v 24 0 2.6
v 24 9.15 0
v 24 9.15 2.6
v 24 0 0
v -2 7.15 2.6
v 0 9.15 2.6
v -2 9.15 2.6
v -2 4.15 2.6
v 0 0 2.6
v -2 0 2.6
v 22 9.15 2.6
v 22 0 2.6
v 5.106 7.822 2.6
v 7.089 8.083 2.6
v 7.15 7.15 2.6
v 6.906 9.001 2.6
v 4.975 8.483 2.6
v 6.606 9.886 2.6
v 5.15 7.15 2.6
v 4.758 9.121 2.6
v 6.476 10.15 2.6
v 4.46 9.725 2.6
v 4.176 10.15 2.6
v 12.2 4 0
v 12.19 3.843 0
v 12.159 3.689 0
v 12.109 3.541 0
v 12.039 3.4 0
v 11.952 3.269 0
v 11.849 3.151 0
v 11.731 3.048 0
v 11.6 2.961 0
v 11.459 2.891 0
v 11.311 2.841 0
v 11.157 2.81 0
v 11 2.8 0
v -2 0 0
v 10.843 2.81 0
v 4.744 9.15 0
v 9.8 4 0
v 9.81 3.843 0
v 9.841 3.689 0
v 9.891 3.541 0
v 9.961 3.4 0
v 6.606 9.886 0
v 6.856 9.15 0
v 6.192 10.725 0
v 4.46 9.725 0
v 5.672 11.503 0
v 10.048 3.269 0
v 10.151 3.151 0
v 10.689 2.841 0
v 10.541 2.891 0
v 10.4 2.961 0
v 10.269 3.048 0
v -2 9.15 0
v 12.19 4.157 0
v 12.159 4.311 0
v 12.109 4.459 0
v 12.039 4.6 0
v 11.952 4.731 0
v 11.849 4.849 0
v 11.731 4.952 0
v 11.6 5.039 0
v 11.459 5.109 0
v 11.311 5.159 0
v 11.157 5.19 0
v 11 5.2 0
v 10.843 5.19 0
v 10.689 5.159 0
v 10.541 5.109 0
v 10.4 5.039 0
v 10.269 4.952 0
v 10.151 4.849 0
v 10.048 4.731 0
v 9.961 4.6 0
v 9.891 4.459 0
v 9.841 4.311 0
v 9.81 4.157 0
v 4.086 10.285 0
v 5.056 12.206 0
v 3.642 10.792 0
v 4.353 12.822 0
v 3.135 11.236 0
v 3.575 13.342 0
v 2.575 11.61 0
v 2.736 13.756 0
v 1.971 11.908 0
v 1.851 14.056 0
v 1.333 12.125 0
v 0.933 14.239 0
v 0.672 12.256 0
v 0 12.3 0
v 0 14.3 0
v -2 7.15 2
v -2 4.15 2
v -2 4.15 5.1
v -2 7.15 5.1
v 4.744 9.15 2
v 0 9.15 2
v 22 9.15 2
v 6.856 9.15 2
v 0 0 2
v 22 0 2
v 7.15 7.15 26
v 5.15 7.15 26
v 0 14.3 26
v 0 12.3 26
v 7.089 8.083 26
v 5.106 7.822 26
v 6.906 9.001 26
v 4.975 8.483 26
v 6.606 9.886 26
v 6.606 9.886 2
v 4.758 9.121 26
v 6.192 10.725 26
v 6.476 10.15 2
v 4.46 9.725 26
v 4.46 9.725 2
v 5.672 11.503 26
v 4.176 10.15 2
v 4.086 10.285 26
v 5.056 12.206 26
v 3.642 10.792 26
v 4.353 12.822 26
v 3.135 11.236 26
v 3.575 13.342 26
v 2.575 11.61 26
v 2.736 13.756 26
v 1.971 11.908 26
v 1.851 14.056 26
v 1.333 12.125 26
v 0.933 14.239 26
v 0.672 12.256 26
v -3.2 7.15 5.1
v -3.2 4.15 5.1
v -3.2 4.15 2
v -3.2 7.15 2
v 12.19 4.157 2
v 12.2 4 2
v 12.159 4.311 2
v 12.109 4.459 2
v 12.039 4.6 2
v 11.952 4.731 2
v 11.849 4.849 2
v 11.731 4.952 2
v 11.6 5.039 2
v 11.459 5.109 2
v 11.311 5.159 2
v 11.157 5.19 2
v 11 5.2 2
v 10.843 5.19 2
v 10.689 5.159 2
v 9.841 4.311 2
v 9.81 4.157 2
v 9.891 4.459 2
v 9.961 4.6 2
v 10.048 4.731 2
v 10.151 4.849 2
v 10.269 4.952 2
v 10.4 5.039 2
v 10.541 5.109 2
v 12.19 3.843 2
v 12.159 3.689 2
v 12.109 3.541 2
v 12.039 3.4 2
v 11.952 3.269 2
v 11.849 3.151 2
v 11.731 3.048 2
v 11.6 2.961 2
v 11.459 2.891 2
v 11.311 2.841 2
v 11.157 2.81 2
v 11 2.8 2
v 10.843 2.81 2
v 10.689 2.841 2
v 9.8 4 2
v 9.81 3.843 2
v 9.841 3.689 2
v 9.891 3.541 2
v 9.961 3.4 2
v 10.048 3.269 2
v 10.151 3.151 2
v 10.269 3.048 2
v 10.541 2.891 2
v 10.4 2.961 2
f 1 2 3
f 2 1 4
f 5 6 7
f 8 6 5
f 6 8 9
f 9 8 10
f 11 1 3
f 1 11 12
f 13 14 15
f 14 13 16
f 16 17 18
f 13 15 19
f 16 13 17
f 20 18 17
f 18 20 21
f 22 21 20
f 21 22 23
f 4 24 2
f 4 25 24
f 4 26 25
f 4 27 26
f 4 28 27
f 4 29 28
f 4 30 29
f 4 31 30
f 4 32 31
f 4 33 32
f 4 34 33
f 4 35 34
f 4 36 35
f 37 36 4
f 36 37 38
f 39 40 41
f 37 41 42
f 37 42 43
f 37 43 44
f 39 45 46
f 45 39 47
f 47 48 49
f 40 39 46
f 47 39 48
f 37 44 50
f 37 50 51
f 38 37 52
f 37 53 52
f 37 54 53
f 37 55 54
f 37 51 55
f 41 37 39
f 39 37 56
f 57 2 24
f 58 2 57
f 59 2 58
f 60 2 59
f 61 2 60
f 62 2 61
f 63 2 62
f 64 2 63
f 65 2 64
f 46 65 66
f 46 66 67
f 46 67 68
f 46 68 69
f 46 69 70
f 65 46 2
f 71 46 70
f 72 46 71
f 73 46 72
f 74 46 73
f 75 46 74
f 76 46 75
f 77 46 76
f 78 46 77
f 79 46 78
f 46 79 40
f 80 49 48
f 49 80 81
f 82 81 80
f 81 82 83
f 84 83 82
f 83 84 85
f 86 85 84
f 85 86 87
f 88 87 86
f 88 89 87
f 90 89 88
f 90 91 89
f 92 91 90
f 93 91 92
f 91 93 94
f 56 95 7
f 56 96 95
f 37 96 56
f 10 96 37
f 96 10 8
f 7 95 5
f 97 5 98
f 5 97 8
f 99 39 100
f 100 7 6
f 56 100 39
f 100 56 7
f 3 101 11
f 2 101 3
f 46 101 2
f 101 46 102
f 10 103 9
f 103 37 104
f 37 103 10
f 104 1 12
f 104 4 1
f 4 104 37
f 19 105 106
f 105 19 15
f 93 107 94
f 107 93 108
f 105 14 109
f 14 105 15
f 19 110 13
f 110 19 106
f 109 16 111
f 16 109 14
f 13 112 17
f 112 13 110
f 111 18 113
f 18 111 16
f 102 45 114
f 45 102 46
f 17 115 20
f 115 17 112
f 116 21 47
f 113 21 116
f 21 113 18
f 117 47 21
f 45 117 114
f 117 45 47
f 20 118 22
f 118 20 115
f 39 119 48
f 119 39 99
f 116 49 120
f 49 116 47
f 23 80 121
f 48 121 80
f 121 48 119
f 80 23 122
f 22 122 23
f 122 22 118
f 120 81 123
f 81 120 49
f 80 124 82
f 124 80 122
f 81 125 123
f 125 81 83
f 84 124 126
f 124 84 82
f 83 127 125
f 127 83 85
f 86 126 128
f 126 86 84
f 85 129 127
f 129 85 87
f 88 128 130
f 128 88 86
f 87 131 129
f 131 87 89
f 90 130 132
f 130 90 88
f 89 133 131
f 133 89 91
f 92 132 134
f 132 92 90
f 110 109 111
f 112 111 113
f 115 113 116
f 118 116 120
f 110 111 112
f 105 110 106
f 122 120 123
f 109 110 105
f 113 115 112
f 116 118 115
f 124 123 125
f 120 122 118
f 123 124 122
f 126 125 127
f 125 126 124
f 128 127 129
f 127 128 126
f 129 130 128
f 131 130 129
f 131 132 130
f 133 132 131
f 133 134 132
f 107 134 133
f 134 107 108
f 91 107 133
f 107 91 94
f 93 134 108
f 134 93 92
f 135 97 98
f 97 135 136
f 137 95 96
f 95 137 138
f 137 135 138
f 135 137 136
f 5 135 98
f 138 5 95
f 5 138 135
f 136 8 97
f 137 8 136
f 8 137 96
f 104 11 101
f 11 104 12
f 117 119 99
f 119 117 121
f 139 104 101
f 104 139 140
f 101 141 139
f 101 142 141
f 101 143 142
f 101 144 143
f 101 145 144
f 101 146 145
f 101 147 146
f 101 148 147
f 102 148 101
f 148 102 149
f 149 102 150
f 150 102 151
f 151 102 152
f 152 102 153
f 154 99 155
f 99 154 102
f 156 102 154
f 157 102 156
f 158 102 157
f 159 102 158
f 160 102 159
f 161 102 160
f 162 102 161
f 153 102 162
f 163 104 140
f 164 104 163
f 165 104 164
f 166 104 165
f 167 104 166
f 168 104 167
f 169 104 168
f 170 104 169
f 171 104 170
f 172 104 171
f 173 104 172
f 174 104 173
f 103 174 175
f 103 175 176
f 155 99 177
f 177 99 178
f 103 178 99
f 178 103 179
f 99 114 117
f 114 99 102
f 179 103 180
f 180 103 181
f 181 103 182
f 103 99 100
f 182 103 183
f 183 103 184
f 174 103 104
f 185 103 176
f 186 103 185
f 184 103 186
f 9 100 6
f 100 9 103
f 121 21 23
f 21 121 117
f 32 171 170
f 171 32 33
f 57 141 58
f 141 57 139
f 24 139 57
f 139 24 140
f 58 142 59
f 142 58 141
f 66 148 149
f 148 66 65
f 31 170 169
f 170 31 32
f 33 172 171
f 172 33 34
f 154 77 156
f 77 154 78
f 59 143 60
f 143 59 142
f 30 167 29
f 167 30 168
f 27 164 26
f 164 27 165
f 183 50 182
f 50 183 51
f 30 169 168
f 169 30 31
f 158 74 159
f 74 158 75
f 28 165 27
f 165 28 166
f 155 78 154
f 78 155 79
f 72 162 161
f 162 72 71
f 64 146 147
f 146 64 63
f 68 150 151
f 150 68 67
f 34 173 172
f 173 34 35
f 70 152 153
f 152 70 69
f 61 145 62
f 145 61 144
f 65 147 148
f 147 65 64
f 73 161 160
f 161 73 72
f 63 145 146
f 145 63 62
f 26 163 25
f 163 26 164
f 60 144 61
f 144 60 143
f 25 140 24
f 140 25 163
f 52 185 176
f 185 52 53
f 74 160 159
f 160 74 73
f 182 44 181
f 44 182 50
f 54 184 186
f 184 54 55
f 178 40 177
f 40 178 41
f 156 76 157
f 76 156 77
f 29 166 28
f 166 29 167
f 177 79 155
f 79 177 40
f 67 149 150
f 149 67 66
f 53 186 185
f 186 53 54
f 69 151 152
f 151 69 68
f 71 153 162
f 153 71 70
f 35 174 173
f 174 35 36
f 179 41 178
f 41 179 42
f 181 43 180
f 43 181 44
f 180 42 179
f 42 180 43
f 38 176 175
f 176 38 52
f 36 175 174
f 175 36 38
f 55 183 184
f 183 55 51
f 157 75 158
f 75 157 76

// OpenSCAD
// file: params.scad
/*
 * params.scad — every dimension the printed parts share, in millimetres.
 * ======================================================================
 * Included by all cad/*.scad files. No dimension may be duplicated in a part
 * file; if two parts need the same number, it lives here.
 *
 * Values marked MEASURE are design targets until caliper measurements of a real
 * X240 top section replace them (issue #44). Everything else is a design choice.
 */

// ---------------------------------------------------------------- deck / case
case_width  = 309.0;   // MEASURE  X, left to right, at the deck's mating surface
case_depth  = 210.0;   // MEASURE  Y, front (palmrest) to back
wall_t      = 2.5;     // PETG shell wall
corner_r    = 3.0;     // MEASURE  outer corner radius
internal_h  = 18.0;    // floor-to-deck clearance (see docs/enclosure/integration.md)
case_h      = internal_h + wall_t;

// Screw bosses that meet the X240 deck, from the front-left corner.  MEASURE all.
deck_boss_positions = [
    [  8.0,   8.0 ], [ 60.0,   8.0 ], [150.0,   8.0 ], [250.0,   8.0 ], [301.0,   8.0 ],
    [  8.0, 202.0 ], [150.0, 202.0 ], [301.0, 202.0 ],
];
boss_od = 6.0;
boss_id = 3.2;         // M2 heat-set insert hole (insert OD ~3.2 for a 3.5 mm body)

// ---------------------------------------------------------------- split joint
split      = true;     // print as two halves (fits a 220 mm bed); false = one piece
split_x    = case_width / 2;
tab_count  = 3;        // dovetail tabs along the floor seam
tab_w      = 14.0;     // tab width at the seam
tab_flare  = 3.0;      // extra width at the tip (dovetail angle)
tab_len    = 10.0;     // how far the tab reaches into the other half
joint_gap  = 0.15;     // clearance per face; tune with a 30 mm coupon
pin_d      = 3.0;      // alignment pins through the front/rear walls
pin_len    = 10.0;

// ---------------------------------------------------------------- board / sled
board_w    = 100.0;    // stripboard or Rev B PCB
board_d    = 80.0;
board_hole_inset = 4.0;                  // M2 holes this far from each board corner
board_hole_d     = 2.4;
sled_margin      = 6.0;                  // sled extends this far past the board
sled_t           = 2.0;
sled_standoff_h  = 6.0;                  // board sits this high above the sled
sled_standoff_od = 5.0;
// sled centre in the case (rear-centre; see docs/enclosure/integration.md)
sled_center = [ case_width / 2, case_depth - 8 - board_d / 2 - sled_margin - 6 ];
// sled-to-case bosses (around the sled, two per half so the sled bridges the seam)
sled_boss_offsets = [ [-56, -46], [56, -46], [-56, 46], [56, 46] ];

// ---------------------------------------------------------------- Pico
pico_w = 51.0;
pico_d = 21.0;
pico_h = 1.0;          // PCB thickness
pico_hole_d = 2.1;     // Pico mounting holes, 11.4 x 47 mm pattern
pico_hole_dx = 47.0;
pico_hole_dy = 11.4;

// ---------------------------------------------------------------- USB
usb_c     = false;                     // false = Micro-USB cutout, true = USB-C
usb_w     = usb_c ? 9.5 : 8.5;
usb_h     = usb_c ? 4.0 : 3.5;
usb_x     = sled_center[0];            // cutout centred on the board
usb_z     = wall_t + sled_t + sled_standoff_h + 1.6;   // bottom of the Pico's connector
cable_d   = 4.5;                       // USB cable jacket diameter
relief_w  = 22.0;                      // strain-relief bezel footprint
relief_d  = 12.0;
relief_h  = 10.0;

// ---------------------------------------------------------------- FPC
fpc_w        = 22.0;   // 40-pin 0.5 mm cable width
fpc_t        = 0.3;
fpc_min_r    = 5.0;    // minimum bend radius
clickpad_fpc_w = 8.0;  // MEASURE  ClickPad cable width
zif_body_w   = 26.0;   // 40-pin ZIF connector body length along the cable edge
zif_body_d   = 6.0;
zif_body_h   = 5.0;
zif_cp_body_w = 12.0;  // ClickPad ZIF body (pin count from probing)

// ---------------------------------------------------------------- gasket, vents, feet
gasket_depth = 1.2;
gasket_width = 2.0;
vents        = false;  // not thermally needed (docs/enclosure/durability.md)
vent_w = 40.0; vent_h = 2.0; vent_count = 4; vent_spacing = 6.0;
ribs         = true;   // two front-to-back stiffening ribs in the floor
rib_t        = 2.0;
rib_h        = 4.0;

foot_d       = 10.0;   // rubber feet, front
foot_recess  = 1.0;
foot_positions = [ [25, 20], [case_width - 25, 20] ];
tilt_positions = [ [25, case_depth - 20], [case_width - 25, case_depth - 20] ];
tilt_h       = 12.0;   // rear riser height
tilt_w       = 30.0;
tilt_d       = 20.0;
tilt_screw_d = 3.4;    // M3 clearance

// ---------------------------------------------------------------- LED light pipe
pipe_d       = 3.0;
pipe_flange_d= 5.0;
pipe_len     = internal_h - 2;
pipe_position = [ sled_center[0] + board_w / 2 + 15, sled_center[1] - 20 ];  // beside the touchpad

// ---------------------------------------------------------------- printing
fit      = 0.2;        // general hole clearance for printed-in-place fits
$fn      = 48;
// main file
/*
 * fpc_cable_guide.scad — FPC bend-radius clip
 * ===========================================
 * Guides the 40-pin FFC through a quarter turn at no less than fpc_min_r, so the
 * cable cannot kink at the seam or a rib.  Screws or glues to the case floor.
 *
 *   cable = "keyboard" | "clickpad"
 */
include <params.scad>

cable = "keyboard";
cw = (cable == "keyboard") ? fpc_w : clickpad_fpc_w;
body_t = 2.0;
gap = fpc_t + 0.3;
arch_r = fpc_min_r + fpc_t / 2;

module cable_guide() {
    arch_od = arch_r + body_t;
    difference() {
        union() {
            translate([-body_t, 0, 0]) cube([cw + 2 * body_t, body_t + arch_od, body_t + gap]);
            translate([0, arch_od, 0]) rotate_extrude(angle = 90) translate([arch_r, 0, 0]) square([body_t, cw + 2 * body_t]);
            translate([-body_t - 1.2, arch_od - 3, body_t]) cube([1.2, 3, gap + 2.5]);   // retaining tab
        }
        translate([0, -1, body_t]) cube([cw, body_t + arch_od + 2, gap]);
        translate([cw / 2, body_t + 2, -1]) cylinder(h = body_t + 2, d = 2.4);              // M2 to the floor
    }
}

cable_guide();
